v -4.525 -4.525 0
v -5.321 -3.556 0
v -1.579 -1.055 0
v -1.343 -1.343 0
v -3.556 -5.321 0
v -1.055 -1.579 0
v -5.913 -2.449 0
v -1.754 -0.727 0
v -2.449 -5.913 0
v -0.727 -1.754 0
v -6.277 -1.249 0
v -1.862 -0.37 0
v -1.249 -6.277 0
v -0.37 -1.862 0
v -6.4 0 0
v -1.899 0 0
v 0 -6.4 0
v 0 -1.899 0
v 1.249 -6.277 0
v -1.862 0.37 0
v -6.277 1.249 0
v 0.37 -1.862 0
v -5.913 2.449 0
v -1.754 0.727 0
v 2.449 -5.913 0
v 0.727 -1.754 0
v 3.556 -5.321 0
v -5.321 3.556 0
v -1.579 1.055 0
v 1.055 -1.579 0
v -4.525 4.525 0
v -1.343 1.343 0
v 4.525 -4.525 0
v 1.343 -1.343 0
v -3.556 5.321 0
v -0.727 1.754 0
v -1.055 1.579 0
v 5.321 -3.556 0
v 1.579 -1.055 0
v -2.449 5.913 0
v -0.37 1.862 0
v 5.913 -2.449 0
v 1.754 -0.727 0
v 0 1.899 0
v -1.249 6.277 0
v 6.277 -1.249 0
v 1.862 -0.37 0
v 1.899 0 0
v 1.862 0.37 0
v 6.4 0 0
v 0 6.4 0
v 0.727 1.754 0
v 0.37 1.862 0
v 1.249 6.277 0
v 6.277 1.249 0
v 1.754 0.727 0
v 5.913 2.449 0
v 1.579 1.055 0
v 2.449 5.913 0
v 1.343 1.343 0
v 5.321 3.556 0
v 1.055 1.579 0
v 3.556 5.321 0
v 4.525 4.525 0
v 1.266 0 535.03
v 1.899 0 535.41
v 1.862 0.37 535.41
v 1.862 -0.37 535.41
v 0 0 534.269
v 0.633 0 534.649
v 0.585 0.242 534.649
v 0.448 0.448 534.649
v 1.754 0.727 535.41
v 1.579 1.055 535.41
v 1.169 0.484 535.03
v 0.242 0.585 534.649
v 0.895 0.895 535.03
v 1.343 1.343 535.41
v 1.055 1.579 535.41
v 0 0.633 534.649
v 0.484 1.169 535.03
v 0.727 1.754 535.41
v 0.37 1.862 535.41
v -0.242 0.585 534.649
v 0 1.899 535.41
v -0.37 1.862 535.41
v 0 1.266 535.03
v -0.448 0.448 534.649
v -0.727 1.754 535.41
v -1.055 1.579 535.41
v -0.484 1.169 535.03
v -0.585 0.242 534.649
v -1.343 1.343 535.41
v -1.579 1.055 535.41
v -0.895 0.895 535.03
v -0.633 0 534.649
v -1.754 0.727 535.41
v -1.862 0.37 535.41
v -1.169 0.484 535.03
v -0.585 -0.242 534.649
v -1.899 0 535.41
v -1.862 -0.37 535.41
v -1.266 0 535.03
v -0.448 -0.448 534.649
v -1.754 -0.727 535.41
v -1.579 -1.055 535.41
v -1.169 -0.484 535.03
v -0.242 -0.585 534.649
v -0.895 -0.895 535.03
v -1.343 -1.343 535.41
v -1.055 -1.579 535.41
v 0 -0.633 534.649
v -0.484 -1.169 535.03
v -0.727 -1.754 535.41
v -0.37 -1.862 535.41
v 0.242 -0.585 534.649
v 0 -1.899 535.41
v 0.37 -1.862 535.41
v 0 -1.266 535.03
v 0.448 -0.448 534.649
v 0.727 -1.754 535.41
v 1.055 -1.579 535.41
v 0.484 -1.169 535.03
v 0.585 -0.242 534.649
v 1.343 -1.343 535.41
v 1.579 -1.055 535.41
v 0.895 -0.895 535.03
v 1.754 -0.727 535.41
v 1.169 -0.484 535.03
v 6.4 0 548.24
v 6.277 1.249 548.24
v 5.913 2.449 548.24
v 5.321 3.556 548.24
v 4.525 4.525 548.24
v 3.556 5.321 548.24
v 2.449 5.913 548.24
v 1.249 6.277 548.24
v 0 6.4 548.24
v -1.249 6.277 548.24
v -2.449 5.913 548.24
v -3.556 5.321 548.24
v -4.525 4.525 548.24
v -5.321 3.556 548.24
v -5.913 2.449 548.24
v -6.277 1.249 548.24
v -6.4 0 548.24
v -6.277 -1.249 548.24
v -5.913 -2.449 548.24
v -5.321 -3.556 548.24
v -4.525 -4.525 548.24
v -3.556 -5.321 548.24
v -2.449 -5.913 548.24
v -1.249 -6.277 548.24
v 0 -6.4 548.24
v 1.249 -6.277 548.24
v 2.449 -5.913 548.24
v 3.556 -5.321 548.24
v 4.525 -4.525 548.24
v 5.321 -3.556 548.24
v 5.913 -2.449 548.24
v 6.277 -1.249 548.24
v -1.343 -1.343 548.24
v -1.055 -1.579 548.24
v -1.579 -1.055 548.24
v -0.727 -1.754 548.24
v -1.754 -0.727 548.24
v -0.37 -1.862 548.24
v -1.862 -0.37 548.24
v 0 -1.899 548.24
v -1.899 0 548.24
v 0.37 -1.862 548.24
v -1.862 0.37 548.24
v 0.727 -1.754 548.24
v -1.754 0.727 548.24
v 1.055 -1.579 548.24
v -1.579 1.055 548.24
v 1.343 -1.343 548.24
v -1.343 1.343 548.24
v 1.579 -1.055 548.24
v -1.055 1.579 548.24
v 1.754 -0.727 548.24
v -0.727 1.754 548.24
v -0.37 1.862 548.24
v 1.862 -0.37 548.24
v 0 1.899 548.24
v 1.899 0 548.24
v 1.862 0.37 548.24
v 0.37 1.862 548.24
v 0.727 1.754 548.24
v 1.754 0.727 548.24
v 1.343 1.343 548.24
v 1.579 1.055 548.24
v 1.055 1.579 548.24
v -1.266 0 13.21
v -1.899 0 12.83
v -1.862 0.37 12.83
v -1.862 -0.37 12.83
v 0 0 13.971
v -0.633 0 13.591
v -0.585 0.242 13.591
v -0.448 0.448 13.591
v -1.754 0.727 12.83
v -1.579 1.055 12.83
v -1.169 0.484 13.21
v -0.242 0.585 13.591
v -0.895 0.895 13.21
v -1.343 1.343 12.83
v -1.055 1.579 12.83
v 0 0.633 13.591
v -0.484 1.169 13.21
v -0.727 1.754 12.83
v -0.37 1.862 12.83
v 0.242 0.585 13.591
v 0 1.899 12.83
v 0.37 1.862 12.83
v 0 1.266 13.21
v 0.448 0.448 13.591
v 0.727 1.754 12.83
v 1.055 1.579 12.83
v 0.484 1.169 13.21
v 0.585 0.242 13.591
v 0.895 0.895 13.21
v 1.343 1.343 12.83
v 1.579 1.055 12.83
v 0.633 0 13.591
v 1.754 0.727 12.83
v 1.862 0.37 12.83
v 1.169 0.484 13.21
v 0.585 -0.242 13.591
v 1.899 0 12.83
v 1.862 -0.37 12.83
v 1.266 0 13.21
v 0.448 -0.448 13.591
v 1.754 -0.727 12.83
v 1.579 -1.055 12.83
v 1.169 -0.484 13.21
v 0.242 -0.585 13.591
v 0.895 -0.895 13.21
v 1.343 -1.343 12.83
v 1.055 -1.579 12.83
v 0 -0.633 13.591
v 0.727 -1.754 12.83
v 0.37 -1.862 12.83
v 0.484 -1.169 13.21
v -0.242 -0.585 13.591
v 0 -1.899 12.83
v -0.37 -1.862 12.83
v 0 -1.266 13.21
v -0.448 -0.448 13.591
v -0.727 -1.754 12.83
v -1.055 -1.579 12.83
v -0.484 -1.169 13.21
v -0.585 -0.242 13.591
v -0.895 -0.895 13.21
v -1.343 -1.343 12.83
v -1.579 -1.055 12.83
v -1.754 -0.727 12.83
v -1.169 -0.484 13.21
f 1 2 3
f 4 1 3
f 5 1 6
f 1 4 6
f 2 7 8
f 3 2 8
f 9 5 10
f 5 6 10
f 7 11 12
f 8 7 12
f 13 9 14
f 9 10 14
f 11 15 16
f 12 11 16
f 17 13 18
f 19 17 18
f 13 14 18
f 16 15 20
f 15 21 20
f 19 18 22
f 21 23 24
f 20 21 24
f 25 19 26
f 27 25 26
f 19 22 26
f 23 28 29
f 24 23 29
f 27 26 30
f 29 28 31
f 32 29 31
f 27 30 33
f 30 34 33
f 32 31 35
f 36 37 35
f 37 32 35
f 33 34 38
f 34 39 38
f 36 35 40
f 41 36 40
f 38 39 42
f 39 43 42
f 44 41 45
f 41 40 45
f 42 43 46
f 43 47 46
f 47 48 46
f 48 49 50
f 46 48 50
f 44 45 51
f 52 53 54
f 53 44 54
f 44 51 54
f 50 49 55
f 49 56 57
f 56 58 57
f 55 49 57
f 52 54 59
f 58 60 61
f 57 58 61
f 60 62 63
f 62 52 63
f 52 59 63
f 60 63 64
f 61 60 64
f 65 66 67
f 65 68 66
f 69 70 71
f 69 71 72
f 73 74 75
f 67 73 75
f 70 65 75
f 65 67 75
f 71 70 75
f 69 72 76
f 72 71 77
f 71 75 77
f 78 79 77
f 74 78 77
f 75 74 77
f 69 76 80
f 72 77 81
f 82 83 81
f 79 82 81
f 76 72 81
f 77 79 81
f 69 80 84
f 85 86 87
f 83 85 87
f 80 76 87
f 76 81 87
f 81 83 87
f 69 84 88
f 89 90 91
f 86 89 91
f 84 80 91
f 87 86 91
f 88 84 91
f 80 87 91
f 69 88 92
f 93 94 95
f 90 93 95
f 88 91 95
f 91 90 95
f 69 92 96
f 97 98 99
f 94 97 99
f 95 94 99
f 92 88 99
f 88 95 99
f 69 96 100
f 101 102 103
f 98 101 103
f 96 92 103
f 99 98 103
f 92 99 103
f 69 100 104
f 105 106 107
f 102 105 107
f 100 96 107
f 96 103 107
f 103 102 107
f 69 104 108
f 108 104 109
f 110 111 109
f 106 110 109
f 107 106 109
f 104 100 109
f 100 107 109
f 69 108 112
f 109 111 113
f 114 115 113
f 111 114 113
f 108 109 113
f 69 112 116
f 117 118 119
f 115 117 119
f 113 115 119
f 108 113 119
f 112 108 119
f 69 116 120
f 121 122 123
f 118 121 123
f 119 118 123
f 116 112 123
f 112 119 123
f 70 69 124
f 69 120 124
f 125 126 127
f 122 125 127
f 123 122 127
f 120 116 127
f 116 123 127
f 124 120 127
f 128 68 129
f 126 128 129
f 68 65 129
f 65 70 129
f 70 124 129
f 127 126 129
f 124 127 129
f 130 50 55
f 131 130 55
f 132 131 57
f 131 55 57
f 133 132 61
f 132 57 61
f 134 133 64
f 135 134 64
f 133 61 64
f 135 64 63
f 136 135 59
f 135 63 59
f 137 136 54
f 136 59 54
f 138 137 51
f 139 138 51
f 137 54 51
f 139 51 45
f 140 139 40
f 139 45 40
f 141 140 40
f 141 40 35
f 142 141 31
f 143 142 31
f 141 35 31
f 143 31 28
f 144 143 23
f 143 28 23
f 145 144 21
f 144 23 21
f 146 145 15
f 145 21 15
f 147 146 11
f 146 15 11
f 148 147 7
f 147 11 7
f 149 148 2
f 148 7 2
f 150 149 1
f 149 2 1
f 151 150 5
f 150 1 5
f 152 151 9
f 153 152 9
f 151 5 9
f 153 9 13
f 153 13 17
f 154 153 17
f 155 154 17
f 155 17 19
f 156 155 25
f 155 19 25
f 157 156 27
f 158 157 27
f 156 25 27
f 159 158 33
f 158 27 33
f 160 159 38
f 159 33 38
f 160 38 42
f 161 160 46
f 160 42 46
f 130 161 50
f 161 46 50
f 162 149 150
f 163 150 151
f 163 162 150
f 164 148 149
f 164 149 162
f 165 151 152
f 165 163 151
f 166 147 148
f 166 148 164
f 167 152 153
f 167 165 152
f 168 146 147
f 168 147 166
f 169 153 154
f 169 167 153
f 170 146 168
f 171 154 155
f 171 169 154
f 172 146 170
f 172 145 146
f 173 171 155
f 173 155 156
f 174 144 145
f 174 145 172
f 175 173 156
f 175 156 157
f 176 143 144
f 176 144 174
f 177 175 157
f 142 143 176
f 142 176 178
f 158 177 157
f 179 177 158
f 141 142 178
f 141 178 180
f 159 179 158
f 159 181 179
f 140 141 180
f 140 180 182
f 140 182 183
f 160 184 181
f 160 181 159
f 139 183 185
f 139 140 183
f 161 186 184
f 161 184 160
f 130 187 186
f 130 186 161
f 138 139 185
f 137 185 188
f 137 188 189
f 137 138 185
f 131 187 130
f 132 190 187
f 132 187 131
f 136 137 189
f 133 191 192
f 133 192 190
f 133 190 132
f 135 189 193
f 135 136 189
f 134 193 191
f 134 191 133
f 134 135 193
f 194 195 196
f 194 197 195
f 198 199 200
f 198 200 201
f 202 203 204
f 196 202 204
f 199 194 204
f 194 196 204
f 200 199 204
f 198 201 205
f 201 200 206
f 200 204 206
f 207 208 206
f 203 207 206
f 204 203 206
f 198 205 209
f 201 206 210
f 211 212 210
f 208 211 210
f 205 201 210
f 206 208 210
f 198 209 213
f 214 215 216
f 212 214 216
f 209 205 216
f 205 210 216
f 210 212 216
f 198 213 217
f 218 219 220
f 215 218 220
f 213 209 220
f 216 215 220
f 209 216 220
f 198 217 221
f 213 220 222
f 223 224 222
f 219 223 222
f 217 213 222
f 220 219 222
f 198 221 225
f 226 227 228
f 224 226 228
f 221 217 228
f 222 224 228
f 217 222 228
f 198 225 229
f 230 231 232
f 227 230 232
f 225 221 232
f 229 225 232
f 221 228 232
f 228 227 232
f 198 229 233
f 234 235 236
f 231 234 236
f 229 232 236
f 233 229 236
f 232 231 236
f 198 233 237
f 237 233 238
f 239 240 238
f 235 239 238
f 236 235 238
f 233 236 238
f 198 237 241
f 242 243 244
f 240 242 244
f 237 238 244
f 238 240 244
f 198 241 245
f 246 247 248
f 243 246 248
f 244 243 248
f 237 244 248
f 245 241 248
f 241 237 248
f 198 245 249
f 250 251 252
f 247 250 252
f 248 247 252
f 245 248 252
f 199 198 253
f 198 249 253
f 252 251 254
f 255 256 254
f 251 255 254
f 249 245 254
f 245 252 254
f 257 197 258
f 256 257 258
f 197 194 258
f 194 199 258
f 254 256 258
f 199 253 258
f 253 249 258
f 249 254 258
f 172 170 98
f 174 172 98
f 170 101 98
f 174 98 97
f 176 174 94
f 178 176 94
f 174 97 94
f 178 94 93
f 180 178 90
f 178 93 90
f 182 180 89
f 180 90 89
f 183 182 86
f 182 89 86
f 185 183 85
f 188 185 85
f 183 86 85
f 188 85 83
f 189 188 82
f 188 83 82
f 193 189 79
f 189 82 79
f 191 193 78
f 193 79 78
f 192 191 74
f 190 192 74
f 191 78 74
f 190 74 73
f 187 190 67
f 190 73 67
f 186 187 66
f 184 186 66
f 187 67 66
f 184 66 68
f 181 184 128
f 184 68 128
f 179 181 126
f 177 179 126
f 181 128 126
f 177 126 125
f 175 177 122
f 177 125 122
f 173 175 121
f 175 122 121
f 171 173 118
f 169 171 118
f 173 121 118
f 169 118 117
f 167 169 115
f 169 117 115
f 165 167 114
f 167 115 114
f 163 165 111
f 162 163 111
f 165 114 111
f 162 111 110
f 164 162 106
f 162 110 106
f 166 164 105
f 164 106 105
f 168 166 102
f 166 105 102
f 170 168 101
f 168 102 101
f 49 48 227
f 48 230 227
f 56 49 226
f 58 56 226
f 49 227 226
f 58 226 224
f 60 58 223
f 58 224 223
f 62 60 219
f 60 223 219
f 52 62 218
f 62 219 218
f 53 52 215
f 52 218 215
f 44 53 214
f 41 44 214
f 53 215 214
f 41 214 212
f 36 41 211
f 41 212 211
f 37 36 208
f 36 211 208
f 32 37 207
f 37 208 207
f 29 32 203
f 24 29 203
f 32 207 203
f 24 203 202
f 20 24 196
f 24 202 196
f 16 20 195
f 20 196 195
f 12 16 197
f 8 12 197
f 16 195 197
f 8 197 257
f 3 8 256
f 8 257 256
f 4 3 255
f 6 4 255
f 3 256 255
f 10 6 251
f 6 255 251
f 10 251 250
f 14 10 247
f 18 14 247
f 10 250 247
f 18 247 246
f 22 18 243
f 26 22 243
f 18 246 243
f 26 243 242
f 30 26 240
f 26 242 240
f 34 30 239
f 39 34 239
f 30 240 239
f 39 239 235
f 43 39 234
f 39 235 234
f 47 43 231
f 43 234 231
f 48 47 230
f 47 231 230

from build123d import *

# Parameters (mm, degrees)
SKETCH1_R                  = 6.4
BOSS_EXTRUDE1_DEPTH        = 548.24
F_10_24_TAPPED_HOLE1_D     = 3.7973
F_10_24_TAPPED_HOLE1_DEPTH = 12.83
F_10_24_TAPPED_HOLE1_TIP   = 1.140824014
F_10_24_TAPPED_HOLE2_D     = 3.7973
F_10_24_TAPPED_HOLE2_DEPTH = 12.83
F_10_24_TAPPED_HOLE2_TIP   = 1.140824014


with BuildPart() as part:
    # Sketch1 → Boss-Extrude1 (new body)
    with BuildSketch(Plane.XY):
        Circle(SKETCH1_R)
    extrude(amount=BOSS_EXTRUDE1_DEPTH)

    # #10-24 Tapped Hole1
    with Locations(Plane(origin=(0, 0, 0), x_dir=(-1, 0, 0), z_dir=(0, 0, -1))):
        with Locations((0, 0)):
            Hole(F_10_24_TAPPED_HOLE1_D / 2, depth=F_10_24_TAPPED_HOLE1_DEPTH)
            with Locations((0, 0, -(F_10_24_TAPPED_HOLE1_DEPTH + F_10_24_TAPPED_HOLE1_TIP / 2))):  # 118° drill point
                Cone(0, F_10_24_TAPPED_HOLE1_D / 2, F_10_24_TAPPED_HOLE1_TIP, mode=Mode.SUBTRACT)

    # #10-24 Tapped Hole2
    with Locations(Plane.XY.offset(548.24)):
        with Locations((0, 0)):
            Hole(F_10_24_TAPPED_HOLE2_D / 2, depth=F_10_24_TAPPED_HOLE2_DEPTH)
            with Locations((0, 0, -(F_10_24_TAPPED_HOLE2_DEPTH + F_10_24_TAPPED_HOLE2_TIP / 2))):  # 118° drill point
                Cone(0, F_10_24_TAPPED_HOLE2_D / 2, F_10_24_TAPPED_HOLE2_TIP, mode=Mode.SUBTRACT)


solid = part.part
